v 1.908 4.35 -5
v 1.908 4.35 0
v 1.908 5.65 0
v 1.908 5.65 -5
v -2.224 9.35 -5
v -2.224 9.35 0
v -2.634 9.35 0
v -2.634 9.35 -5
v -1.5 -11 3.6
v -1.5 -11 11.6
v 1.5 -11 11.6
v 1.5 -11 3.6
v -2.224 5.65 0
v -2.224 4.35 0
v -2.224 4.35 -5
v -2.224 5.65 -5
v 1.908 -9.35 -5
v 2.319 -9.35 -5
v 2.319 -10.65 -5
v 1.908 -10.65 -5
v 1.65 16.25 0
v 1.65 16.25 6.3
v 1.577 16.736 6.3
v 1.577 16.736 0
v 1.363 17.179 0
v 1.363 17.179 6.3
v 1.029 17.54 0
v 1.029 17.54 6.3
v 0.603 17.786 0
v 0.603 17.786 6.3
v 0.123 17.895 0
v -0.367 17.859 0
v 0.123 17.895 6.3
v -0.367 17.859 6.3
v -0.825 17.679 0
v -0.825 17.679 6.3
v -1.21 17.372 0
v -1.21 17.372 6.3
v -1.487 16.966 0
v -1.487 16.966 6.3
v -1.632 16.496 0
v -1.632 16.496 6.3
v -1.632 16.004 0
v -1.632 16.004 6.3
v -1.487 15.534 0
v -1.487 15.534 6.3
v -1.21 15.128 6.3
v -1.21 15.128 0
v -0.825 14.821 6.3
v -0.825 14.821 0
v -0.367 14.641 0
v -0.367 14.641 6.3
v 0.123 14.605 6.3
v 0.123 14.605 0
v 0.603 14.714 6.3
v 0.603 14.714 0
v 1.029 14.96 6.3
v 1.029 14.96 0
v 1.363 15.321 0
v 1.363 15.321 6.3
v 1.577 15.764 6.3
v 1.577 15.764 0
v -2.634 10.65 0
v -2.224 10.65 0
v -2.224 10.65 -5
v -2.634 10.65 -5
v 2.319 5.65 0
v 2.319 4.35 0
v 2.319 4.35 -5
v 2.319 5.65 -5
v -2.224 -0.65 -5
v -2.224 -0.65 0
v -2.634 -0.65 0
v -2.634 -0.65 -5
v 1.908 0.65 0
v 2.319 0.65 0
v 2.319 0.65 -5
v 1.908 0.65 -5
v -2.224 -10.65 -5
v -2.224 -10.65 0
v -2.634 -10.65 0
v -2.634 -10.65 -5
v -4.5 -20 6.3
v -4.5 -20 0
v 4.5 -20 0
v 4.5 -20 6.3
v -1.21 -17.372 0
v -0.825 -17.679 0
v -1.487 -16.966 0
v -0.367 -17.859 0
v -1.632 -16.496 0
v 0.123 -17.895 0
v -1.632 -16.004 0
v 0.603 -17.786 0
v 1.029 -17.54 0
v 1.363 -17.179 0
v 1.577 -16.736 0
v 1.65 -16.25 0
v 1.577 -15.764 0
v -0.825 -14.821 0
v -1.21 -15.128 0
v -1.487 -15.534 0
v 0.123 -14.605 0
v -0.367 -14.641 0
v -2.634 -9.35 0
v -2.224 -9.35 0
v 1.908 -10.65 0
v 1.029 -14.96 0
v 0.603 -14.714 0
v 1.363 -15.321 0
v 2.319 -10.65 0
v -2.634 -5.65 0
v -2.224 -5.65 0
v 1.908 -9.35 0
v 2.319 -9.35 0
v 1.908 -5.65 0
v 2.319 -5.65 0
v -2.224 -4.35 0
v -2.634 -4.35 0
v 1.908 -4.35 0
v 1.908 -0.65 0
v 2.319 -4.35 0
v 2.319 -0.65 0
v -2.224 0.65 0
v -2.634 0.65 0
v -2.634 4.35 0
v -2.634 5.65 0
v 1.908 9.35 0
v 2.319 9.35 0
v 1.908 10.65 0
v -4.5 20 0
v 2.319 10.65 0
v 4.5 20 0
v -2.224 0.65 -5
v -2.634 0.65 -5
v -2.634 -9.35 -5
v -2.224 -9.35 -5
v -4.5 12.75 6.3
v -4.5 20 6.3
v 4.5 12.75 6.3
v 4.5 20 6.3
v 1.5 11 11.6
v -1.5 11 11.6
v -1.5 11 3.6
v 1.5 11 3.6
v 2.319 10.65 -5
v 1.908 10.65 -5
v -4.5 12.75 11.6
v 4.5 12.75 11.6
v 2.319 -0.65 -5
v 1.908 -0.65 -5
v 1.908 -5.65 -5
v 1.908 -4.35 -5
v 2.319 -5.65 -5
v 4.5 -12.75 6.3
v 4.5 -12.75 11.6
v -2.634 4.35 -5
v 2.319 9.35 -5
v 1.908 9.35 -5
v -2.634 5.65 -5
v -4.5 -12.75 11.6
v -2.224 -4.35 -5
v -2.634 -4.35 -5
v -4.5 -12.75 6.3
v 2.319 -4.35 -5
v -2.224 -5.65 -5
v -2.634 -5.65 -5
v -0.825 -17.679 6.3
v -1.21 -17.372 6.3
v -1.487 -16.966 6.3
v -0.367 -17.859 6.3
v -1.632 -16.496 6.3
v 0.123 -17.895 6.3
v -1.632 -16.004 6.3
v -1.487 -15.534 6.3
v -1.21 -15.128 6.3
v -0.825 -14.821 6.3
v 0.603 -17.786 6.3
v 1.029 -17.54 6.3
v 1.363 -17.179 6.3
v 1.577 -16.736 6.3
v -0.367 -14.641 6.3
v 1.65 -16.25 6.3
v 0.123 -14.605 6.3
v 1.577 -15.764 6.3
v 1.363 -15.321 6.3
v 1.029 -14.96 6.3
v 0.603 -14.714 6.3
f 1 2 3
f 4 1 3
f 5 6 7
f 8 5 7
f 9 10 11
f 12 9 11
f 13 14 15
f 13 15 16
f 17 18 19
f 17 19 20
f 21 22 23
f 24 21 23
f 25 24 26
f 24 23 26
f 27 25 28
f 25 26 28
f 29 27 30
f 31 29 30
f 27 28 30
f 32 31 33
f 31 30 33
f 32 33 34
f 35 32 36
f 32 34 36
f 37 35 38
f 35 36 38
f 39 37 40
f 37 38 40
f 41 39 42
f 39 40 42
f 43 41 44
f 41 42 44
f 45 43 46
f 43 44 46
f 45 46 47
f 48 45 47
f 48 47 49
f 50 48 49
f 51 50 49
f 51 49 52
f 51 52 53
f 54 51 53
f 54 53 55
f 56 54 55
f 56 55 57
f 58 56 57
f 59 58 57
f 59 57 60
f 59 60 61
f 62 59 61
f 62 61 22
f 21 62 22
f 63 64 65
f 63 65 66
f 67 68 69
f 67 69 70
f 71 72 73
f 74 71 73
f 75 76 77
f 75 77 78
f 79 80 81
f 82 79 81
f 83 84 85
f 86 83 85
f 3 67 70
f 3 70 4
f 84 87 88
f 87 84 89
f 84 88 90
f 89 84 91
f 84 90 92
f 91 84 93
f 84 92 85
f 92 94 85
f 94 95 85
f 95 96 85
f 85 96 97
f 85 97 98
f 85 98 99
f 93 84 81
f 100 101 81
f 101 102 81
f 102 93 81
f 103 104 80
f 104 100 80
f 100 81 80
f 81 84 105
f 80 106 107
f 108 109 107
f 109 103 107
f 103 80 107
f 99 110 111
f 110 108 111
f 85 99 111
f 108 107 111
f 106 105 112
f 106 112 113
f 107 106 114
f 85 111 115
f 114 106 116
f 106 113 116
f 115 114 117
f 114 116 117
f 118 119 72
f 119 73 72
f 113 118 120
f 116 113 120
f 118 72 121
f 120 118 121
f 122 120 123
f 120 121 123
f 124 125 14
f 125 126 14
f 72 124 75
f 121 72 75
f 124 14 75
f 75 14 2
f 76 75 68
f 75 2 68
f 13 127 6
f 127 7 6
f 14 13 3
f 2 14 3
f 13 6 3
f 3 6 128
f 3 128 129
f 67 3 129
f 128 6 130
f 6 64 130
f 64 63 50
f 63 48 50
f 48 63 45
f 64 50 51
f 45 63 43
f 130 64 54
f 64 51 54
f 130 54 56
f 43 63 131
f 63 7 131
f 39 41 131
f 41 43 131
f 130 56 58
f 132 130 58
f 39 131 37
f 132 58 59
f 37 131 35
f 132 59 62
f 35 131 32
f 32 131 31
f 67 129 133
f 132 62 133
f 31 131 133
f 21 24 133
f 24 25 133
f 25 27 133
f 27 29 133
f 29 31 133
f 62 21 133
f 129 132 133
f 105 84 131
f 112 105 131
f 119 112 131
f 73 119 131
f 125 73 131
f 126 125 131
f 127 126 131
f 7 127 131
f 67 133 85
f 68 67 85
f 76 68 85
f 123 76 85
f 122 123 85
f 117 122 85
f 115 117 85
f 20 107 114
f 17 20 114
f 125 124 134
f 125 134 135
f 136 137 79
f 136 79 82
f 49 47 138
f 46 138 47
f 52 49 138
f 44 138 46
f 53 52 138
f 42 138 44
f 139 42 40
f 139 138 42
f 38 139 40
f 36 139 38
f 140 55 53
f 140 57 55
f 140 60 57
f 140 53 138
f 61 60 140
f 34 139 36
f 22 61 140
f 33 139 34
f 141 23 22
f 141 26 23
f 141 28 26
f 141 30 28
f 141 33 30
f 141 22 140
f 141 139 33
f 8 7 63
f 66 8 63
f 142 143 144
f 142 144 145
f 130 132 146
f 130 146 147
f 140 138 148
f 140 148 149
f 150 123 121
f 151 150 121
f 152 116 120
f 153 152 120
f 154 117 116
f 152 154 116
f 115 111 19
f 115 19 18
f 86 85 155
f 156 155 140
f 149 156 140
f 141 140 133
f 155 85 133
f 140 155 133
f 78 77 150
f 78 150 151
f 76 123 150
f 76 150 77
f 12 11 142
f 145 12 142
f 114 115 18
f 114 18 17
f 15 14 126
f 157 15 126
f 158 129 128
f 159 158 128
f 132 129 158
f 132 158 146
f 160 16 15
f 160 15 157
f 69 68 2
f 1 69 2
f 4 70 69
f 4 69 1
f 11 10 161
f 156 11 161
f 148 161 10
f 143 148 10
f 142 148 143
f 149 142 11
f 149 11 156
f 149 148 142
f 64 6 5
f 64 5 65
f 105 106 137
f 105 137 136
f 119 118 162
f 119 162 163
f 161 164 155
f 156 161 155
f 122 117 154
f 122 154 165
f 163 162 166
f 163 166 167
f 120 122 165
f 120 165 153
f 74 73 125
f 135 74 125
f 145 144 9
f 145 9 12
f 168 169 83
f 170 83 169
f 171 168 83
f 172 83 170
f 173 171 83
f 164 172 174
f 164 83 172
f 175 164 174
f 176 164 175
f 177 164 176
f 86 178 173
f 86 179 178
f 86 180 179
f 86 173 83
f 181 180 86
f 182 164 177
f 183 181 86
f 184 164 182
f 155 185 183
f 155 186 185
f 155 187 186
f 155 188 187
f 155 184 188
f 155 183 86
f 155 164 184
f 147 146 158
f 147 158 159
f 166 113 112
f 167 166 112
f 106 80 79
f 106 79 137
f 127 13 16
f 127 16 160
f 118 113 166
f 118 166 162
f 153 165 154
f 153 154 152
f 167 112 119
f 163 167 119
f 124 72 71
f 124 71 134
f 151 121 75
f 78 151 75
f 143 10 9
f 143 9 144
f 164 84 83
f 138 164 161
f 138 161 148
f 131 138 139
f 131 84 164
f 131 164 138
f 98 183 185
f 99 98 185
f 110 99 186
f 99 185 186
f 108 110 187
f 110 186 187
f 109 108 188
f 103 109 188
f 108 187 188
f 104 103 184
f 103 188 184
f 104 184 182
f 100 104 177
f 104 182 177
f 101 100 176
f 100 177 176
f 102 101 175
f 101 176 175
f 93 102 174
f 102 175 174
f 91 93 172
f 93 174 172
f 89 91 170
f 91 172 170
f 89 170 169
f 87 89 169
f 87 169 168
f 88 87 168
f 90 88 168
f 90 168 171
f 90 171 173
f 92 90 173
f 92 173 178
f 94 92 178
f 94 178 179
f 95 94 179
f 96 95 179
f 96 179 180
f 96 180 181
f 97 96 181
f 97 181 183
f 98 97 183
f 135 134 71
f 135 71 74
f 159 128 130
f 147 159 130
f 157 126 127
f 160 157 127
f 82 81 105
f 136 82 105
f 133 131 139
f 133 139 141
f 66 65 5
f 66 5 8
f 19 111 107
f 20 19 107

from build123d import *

# Parameters (mm, degrees)
SKETCH_1_W          = 9
SKETCH_1_H          = 40
EXTRUDE_1_DEPTH     = 6.3
SKETCH_2_W          = 9
SKETCH_2_H          = 25.5
EXTRUDE_2_DEPTH     = 5.3
SKETCH_3_R          = 1.65
CUT_EXTRUDE_1_DEPTH = 15.3
SKETCH_4_W          = 0.410265385
SKETCH_4_H          = 1.299173718
EXTRUDE_3_DEPTH     = 5
SKETCH_5_W          = 3
SKETCH_5_H          = 22
CUT_EXTRUDE_2_DEPTH = 8


with BuildPart() as part:
    # 草图1 → 拉伸1 (new body)
    with BuildSketch(Plane.XY):
        Rectangle(SKETCH_1_W, SKETCH_1_H)
    extrude(amount=EXTRUDE_1_DEPTH)

    # 草图2 → 拉伸2 (add)
    with BuildSketch(Plane.XY.offset(6.3)):
        Rectangle(SKETCH_2_W, SKETCH_2_H)
    extrude(amount=EXTRUDE_2_DEPTH)

    # 草图3 → 切除-拉伸1 (cut)
    with BuildSketch(Plane.XY.offset(6.3)):
        with Locations((0, 16.25)):
            Circle(SKETCH_3_R)
        with Locations((0, -16.25)):
            Circle(SKETCH_3_R)
    extrude(amount=-CUT_EXTRUDE_1_DEPTH, mode=Mode.SUBTRACT)

    # 草图4 → 拉伸3 (add)
    with BuildSketch(Plane(origin=(0, 0, 0), x_dir=(-1, 0, 0), z_dir=(0, 0, -1))):
        with Locations((2.428938656, 10)):
            Rectangle(SKETCH_4_W, SKETCH_4_H)
        with Locations((-2.113574837, 10)):
            Rectangle(SKETCH_4_W, SKETCH_4_H)
        with Locations((2.428938656, 5)):
            Rectangle(SKETCH_4_W, SKETCH_4_H)
        with Locations((-2.113574837, 5)):
            Rectangle(SKETCH_4_W, SKETCH_4_H)
        with Locations((2.428938656, 0)):
            Rectangle(SKETCH_4_W, SKETCH_4_H)
        with Locations((-2.113574837, 0)):
            Rectangle(SKETCH_4_W, SKETCH_4_H)
        with Locations((-2.113574837, -5)):
            Rectangle(SKETCH_4_W, SKETCH_4_H)
        with Locations((2.428938656, -5)):
            Rectangle(SKETCH_4_W, SKETCH_4_H)
        with Locations((-2.113574837, -10)):
            Rectangle(SKETCH_4_W, SKETCH_4_H)
        with Locations((2.428938656, -10)):
            Rectangle(SKETCH_4_W, SKETCH_4_H)
    extrude(amount=EXTRUDE_3_DEPTH)

    # 草图5 → 切除-拉伸2 (cut)
    with BuildSketch(Plane.XY.offset(11.6)):
        Rectangle(SKETCH_5_W, SKETCH_5_H)
    extrude(amount=-CUT_EXTRUDE_2_DEPTH, mode=Mode.SUBTRACT)


solid = part.part
